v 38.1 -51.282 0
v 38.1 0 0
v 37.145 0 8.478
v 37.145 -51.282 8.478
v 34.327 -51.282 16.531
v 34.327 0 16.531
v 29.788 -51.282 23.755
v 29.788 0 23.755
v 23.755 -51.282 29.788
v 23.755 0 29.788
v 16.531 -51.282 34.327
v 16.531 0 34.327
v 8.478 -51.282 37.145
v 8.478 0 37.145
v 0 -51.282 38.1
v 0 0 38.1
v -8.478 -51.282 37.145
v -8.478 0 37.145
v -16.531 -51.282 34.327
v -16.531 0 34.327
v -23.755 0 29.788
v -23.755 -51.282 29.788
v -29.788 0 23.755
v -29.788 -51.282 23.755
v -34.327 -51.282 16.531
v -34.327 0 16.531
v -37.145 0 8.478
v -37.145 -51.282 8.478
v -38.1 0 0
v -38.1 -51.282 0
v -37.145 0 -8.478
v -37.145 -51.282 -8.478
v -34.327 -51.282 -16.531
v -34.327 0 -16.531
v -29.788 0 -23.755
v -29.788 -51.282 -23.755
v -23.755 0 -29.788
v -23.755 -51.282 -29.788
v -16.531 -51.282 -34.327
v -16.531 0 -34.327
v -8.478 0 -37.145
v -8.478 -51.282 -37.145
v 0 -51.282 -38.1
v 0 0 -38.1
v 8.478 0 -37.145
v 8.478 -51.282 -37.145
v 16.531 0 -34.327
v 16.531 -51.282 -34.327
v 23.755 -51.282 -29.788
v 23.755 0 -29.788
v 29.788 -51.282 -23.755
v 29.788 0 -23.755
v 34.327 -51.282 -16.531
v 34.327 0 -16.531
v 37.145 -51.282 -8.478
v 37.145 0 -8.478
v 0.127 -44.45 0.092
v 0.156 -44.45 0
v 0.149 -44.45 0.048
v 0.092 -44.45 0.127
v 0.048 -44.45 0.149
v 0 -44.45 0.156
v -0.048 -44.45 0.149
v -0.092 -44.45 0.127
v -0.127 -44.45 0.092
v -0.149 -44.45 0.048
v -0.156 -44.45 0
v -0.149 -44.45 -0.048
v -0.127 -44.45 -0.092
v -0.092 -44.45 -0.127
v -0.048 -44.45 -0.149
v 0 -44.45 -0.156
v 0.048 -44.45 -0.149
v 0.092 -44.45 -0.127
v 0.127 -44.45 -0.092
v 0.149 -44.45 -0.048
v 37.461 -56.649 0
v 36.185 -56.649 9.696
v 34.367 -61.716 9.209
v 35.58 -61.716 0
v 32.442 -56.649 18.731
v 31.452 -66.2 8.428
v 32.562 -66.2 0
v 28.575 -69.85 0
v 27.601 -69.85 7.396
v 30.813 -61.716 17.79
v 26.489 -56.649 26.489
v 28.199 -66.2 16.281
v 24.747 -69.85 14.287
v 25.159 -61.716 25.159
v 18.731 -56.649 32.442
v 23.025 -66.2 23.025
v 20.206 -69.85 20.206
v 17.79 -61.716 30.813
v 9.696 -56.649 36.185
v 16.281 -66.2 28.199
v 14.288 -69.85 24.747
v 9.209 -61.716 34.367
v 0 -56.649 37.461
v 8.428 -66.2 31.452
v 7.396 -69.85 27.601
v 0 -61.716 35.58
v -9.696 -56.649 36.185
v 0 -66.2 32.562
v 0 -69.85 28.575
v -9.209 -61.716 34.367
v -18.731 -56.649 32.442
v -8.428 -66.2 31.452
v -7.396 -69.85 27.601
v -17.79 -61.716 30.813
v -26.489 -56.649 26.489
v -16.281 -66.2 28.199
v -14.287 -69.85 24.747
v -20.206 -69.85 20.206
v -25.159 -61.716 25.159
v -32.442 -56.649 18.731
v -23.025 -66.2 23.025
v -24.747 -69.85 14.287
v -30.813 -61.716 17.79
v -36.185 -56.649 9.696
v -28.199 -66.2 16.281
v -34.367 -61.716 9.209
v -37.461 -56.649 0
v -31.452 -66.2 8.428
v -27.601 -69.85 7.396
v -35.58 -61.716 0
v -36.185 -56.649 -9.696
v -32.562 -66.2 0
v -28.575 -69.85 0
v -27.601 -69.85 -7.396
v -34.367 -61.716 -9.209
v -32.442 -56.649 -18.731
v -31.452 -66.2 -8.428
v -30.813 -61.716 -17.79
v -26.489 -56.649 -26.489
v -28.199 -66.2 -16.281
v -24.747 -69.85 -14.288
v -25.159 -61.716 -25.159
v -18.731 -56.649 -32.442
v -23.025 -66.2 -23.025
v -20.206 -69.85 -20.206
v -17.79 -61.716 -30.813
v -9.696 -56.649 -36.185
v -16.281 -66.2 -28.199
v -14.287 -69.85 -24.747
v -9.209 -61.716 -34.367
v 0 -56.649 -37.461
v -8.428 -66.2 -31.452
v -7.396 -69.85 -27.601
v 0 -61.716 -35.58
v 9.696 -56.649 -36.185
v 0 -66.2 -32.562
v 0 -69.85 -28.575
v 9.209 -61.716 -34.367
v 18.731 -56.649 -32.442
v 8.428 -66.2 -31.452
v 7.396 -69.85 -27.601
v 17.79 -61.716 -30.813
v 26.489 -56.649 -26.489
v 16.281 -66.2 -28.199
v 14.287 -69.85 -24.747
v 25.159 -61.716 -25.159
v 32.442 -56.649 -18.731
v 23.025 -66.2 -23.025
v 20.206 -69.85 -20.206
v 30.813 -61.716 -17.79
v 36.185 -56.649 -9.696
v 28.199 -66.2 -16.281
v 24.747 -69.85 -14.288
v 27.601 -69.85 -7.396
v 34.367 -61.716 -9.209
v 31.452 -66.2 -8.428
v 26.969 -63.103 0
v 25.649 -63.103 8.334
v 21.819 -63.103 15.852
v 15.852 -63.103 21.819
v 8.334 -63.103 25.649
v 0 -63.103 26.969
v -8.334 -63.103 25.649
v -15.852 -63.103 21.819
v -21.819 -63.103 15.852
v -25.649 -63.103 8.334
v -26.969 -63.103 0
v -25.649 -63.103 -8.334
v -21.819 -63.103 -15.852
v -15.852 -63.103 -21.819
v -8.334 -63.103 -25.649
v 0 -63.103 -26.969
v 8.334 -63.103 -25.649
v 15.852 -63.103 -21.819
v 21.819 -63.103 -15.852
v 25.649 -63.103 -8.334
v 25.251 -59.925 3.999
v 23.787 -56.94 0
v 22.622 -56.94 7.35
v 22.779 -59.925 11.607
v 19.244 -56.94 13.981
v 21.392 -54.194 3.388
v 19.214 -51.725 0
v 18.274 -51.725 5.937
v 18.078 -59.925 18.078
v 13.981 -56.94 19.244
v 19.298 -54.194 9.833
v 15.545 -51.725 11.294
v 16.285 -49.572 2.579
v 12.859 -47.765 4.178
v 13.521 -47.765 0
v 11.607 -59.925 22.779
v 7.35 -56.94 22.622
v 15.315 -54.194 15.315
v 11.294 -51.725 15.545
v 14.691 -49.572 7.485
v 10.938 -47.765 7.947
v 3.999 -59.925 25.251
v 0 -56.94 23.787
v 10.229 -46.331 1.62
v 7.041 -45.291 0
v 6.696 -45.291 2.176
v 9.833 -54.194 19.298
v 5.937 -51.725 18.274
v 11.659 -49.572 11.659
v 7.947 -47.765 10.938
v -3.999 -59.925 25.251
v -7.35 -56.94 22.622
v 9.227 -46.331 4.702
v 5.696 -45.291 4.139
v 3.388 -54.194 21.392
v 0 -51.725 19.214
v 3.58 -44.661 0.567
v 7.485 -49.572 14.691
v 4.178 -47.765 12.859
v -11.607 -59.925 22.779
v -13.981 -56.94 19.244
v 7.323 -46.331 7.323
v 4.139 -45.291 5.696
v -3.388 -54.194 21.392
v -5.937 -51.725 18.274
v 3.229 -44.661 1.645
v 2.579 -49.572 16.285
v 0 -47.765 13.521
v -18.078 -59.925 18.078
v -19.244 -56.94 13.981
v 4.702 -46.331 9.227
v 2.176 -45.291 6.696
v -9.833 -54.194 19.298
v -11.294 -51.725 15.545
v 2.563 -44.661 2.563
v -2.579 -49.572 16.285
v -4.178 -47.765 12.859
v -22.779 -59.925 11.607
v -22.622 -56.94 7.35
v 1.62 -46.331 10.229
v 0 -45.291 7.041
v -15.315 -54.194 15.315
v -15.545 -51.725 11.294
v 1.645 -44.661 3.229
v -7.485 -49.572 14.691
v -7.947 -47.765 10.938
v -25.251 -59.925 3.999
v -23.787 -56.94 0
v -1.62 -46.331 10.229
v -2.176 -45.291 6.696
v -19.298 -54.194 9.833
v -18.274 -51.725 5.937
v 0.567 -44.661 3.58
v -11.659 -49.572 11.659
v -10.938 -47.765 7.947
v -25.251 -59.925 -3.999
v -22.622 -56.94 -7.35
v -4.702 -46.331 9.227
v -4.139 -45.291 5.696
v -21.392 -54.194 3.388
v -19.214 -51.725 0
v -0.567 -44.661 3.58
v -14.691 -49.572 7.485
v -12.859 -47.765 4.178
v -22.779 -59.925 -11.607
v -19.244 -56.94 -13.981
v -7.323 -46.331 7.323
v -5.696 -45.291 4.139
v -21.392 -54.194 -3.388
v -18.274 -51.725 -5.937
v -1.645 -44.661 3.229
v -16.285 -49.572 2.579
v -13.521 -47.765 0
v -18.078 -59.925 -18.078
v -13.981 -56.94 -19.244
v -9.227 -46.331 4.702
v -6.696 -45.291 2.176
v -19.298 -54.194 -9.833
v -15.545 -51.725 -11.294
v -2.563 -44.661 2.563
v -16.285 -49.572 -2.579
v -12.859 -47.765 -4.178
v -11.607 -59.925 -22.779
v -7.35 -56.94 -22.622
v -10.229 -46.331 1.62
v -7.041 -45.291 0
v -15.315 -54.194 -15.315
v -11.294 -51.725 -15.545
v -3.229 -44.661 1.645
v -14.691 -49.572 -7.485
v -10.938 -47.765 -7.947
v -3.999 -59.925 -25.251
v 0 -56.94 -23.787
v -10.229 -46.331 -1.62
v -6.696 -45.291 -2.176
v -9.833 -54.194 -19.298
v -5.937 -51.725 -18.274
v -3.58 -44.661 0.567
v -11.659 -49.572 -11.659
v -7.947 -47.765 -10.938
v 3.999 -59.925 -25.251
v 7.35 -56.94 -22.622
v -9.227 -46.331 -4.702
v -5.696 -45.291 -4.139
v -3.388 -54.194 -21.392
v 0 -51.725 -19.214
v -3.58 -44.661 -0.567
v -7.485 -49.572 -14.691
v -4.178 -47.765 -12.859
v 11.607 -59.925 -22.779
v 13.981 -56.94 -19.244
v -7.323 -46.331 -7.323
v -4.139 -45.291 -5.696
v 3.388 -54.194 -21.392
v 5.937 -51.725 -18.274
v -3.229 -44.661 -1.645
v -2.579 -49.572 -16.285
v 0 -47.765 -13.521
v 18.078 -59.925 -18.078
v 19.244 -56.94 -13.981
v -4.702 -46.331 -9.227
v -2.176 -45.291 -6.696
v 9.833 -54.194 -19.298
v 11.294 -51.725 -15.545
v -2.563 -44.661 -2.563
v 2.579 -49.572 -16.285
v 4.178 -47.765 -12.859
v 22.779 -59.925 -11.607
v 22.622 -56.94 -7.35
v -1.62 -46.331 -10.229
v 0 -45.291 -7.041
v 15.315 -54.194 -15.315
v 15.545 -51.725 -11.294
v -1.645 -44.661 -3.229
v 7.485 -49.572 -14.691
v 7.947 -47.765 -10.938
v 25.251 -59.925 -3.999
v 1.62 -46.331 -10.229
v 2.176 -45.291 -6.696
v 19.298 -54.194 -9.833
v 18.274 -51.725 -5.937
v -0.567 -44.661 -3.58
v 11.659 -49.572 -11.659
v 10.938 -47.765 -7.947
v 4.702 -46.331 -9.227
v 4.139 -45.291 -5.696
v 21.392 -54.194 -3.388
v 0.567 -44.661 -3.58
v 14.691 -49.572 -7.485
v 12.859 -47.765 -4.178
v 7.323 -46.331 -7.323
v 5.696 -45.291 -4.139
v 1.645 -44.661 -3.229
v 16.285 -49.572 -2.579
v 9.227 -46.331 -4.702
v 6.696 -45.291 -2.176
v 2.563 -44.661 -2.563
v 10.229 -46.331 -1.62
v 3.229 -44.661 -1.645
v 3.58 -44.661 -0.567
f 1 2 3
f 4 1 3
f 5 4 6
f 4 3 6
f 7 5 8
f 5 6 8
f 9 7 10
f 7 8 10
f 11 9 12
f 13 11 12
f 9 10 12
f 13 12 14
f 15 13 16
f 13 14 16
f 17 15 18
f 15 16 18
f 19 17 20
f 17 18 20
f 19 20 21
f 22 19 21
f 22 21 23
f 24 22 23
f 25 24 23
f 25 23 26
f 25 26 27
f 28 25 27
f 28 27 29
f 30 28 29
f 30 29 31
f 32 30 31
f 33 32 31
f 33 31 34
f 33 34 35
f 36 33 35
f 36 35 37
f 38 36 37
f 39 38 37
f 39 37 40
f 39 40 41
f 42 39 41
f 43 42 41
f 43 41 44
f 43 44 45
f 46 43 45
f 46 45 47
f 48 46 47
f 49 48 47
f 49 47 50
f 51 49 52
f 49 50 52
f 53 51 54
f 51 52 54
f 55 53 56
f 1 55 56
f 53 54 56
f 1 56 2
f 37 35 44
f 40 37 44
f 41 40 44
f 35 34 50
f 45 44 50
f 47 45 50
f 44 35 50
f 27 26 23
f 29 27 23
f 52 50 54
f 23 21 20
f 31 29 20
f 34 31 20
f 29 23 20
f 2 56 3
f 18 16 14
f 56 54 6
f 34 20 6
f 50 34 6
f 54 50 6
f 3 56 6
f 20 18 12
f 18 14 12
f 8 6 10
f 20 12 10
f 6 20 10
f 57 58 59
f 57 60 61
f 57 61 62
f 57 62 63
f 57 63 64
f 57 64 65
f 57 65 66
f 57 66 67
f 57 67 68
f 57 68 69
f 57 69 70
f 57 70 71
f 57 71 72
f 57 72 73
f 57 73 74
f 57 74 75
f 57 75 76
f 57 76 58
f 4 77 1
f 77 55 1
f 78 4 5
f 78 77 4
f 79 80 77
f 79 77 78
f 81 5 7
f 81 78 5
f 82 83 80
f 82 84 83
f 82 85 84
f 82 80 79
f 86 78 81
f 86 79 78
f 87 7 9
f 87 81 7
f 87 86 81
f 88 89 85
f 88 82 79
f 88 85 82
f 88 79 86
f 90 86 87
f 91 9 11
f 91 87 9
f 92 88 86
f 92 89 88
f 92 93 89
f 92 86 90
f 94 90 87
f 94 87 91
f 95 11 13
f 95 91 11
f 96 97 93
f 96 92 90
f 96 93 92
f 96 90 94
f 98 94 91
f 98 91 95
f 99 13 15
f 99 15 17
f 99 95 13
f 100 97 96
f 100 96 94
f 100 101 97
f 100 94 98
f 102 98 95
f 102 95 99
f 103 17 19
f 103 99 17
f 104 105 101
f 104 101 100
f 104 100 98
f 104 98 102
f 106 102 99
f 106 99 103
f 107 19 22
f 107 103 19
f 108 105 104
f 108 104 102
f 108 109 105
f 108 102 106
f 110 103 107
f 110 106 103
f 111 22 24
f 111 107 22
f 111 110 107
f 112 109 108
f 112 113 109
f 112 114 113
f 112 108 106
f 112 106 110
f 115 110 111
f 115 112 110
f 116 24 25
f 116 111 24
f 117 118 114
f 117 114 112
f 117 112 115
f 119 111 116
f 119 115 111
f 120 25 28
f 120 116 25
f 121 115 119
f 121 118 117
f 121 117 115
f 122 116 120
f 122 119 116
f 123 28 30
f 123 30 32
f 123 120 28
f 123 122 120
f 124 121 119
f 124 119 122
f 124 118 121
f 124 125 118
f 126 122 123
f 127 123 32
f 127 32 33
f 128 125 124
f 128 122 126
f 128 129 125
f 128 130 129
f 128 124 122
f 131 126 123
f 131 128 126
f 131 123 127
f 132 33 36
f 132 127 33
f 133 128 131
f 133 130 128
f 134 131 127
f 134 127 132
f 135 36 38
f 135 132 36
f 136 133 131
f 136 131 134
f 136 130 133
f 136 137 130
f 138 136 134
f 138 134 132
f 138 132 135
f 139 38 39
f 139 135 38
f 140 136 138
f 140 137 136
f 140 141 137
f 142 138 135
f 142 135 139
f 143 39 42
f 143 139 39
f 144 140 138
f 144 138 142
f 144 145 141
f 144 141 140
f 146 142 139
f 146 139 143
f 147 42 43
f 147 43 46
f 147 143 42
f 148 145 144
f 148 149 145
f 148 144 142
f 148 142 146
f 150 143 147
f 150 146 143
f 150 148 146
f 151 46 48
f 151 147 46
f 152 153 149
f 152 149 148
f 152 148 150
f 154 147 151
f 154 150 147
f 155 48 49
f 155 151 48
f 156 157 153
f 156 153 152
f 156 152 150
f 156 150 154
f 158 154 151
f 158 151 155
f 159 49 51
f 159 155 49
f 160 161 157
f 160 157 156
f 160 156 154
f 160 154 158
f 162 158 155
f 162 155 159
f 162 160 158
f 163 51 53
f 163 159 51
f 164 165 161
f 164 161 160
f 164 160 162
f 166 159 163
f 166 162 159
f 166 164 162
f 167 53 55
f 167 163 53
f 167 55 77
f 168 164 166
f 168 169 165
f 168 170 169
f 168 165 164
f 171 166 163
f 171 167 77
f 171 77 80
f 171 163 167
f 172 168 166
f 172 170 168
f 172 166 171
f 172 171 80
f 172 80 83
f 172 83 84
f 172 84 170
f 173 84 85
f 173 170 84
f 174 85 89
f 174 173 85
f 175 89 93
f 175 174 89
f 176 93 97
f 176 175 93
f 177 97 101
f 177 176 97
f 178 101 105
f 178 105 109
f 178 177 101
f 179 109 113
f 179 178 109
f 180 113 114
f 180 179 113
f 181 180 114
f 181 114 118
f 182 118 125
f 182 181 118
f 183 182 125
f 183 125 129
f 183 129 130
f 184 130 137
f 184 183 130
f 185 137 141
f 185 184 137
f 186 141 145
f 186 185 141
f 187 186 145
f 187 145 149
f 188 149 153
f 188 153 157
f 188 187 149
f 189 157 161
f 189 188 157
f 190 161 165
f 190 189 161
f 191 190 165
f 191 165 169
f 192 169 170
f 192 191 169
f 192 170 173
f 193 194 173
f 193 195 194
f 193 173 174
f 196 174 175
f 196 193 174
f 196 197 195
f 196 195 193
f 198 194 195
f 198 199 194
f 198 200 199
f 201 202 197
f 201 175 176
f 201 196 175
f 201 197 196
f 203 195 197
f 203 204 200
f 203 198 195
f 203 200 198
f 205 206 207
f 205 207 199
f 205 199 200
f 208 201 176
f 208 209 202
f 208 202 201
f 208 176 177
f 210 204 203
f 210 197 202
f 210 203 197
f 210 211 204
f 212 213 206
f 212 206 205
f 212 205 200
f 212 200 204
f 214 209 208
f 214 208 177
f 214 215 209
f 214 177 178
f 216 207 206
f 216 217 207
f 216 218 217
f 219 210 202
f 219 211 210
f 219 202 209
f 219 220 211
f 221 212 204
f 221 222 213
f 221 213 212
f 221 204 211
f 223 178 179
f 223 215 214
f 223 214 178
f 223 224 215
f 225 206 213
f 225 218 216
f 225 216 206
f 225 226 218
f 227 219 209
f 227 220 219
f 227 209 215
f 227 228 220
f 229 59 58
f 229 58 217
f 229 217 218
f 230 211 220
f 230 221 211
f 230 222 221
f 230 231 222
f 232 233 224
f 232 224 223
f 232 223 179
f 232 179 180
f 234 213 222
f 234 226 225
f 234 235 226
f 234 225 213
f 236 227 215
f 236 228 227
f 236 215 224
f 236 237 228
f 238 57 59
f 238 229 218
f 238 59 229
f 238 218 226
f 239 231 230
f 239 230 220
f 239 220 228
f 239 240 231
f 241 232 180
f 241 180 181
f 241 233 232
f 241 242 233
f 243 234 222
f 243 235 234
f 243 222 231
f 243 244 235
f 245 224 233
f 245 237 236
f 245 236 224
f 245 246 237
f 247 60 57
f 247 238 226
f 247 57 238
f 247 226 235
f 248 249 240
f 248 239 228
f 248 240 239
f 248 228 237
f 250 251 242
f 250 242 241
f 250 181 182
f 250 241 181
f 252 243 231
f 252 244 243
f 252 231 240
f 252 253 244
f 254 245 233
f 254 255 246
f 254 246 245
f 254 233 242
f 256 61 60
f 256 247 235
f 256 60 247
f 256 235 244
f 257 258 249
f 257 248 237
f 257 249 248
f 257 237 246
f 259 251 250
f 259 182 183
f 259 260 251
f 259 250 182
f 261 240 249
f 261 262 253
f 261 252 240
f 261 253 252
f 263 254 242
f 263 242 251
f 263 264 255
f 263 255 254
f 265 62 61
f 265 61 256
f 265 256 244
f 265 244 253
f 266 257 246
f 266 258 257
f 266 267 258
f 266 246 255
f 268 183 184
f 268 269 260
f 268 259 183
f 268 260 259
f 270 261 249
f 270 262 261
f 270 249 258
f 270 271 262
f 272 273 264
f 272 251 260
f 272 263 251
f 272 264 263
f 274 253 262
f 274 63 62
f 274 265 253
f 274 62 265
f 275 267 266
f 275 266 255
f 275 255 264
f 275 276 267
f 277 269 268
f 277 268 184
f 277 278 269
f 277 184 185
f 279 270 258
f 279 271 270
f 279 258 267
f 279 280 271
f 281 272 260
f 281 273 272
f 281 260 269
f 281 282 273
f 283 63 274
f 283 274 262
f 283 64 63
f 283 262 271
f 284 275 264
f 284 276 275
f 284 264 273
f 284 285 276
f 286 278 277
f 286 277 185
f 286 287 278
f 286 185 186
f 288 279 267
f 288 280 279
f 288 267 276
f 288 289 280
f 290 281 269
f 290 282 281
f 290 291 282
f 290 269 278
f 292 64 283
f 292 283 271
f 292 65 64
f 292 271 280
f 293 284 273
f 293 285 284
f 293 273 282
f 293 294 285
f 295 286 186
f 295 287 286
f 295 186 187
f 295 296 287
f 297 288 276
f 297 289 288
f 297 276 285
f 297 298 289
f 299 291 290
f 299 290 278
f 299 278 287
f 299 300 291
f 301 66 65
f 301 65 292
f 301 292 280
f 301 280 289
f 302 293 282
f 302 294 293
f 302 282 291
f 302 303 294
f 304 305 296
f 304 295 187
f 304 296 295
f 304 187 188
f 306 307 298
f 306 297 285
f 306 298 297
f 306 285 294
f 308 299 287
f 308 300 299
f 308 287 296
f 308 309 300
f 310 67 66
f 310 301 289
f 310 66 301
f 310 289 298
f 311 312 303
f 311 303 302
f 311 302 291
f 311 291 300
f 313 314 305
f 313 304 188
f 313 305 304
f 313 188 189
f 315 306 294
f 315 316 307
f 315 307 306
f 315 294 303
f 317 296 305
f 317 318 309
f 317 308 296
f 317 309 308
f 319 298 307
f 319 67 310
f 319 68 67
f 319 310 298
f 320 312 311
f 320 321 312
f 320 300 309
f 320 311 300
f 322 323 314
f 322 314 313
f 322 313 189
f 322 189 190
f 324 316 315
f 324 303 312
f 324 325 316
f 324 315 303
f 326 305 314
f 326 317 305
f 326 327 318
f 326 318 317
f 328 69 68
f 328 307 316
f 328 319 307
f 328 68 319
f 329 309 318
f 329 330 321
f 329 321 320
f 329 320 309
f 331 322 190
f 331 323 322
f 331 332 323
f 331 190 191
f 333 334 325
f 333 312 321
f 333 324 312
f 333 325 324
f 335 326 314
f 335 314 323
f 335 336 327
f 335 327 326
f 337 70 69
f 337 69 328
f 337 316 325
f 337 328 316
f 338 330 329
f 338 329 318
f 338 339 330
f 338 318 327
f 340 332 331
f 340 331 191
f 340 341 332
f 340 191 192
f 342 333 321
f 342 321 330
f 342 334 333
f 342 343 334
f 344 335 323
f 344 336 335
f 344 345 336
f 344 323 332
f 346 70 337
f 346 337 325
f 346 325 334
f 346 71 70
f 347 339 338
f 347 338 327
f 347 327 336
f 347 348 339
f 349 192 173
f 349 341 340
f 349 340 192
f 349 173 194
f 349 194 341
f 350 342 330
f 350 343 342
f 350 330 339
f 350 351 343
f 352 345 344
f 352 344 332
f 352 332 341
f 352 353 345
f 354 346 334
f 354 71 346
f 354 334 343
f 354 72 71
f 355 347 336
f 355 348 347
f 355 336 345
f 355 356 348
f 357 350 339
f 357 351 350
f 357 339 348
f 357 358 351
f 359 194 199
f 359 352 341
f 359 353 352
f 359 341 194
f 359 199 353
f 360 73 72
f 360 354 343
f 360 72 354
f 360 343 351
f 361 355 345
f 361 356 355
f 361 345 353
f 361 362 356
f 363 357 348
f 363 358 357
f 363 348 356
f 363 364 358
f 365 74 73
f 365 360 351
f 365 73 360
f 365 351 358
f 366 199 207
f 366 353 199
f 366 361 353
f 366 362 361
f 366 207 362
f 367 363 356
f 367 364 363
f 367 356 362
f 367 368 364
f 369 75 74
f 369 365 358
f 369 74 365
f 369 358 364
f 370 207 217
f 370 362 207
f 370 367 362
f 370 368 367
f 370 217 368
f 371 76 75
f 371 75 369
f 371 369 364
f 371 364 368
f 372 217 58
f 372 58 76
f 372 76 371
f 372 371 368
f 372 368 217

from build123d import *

# Parameters (mm, degrees)
F0_R     = 38.1
F1_DEPTH = 69.85
F2_R     = 28.575
F3_DEPTH = 25.4


# Not quite as in the source:
# - a fillet or chamfer that OpenCascade refuses, or shapes differently, is made with other operations: its cross-section is extruded or revolved along the edge and cut away or added


with BuildPart() as f1:
    # F0 (on Front) → F1 (new body)
    with BuildSketch(Plane.XZ):
        Circle(F0_R)
    extrude(amount=F1_DEPTH)

    # F2 (on face) → F3 (cut)
    with BuildSketch(Plane.XZ.offset(69.85)):
        Circle(F2_R)
    extrude(amount=-F3_DEPTH, mode=Mode.SUBTRACT)

    # F4: fillet of radius 28.59786 on 1 edges, made by hand

    # F4_s1 → F4_t2 (revolve)
    with BuildSketch(Plane.XY):
        with BuildLine():
            ThreePointArc((28.575, -69.85), (19.2141159123, -51.7254592304), (0.1564974356, -44.45))
            Line((0.1564974356, -44.45), (28.575, -44.45))
            Line((28.575, -44.45), (28.575, -69.85))
        make_face()
    revolve(axis=Axis((0, -44.45, 0), (0, -1, 0)))

    # F5: fillet of radius 22.86 on 1 edges, made by hand

    # F5_s1 → F5_t2 (revolve, cut)
    with BuildSketch(Plane.XY):
        with BuildLine():
            ThreePointArc((38.1, -51.2823567731), (35.5798340701, -61.7164714936), (28.575, -69.85))
            Line((28.575, -69.85), (38.1, -69.85))
            Line((38.1, -69.85), (38.1, -51.2823567731))
        make_face()
    revolve(axis=Axis((0, -69.85, 0), (0, -1, 0)), mode=Mode.SUBTRACT)


solid = f1.part
